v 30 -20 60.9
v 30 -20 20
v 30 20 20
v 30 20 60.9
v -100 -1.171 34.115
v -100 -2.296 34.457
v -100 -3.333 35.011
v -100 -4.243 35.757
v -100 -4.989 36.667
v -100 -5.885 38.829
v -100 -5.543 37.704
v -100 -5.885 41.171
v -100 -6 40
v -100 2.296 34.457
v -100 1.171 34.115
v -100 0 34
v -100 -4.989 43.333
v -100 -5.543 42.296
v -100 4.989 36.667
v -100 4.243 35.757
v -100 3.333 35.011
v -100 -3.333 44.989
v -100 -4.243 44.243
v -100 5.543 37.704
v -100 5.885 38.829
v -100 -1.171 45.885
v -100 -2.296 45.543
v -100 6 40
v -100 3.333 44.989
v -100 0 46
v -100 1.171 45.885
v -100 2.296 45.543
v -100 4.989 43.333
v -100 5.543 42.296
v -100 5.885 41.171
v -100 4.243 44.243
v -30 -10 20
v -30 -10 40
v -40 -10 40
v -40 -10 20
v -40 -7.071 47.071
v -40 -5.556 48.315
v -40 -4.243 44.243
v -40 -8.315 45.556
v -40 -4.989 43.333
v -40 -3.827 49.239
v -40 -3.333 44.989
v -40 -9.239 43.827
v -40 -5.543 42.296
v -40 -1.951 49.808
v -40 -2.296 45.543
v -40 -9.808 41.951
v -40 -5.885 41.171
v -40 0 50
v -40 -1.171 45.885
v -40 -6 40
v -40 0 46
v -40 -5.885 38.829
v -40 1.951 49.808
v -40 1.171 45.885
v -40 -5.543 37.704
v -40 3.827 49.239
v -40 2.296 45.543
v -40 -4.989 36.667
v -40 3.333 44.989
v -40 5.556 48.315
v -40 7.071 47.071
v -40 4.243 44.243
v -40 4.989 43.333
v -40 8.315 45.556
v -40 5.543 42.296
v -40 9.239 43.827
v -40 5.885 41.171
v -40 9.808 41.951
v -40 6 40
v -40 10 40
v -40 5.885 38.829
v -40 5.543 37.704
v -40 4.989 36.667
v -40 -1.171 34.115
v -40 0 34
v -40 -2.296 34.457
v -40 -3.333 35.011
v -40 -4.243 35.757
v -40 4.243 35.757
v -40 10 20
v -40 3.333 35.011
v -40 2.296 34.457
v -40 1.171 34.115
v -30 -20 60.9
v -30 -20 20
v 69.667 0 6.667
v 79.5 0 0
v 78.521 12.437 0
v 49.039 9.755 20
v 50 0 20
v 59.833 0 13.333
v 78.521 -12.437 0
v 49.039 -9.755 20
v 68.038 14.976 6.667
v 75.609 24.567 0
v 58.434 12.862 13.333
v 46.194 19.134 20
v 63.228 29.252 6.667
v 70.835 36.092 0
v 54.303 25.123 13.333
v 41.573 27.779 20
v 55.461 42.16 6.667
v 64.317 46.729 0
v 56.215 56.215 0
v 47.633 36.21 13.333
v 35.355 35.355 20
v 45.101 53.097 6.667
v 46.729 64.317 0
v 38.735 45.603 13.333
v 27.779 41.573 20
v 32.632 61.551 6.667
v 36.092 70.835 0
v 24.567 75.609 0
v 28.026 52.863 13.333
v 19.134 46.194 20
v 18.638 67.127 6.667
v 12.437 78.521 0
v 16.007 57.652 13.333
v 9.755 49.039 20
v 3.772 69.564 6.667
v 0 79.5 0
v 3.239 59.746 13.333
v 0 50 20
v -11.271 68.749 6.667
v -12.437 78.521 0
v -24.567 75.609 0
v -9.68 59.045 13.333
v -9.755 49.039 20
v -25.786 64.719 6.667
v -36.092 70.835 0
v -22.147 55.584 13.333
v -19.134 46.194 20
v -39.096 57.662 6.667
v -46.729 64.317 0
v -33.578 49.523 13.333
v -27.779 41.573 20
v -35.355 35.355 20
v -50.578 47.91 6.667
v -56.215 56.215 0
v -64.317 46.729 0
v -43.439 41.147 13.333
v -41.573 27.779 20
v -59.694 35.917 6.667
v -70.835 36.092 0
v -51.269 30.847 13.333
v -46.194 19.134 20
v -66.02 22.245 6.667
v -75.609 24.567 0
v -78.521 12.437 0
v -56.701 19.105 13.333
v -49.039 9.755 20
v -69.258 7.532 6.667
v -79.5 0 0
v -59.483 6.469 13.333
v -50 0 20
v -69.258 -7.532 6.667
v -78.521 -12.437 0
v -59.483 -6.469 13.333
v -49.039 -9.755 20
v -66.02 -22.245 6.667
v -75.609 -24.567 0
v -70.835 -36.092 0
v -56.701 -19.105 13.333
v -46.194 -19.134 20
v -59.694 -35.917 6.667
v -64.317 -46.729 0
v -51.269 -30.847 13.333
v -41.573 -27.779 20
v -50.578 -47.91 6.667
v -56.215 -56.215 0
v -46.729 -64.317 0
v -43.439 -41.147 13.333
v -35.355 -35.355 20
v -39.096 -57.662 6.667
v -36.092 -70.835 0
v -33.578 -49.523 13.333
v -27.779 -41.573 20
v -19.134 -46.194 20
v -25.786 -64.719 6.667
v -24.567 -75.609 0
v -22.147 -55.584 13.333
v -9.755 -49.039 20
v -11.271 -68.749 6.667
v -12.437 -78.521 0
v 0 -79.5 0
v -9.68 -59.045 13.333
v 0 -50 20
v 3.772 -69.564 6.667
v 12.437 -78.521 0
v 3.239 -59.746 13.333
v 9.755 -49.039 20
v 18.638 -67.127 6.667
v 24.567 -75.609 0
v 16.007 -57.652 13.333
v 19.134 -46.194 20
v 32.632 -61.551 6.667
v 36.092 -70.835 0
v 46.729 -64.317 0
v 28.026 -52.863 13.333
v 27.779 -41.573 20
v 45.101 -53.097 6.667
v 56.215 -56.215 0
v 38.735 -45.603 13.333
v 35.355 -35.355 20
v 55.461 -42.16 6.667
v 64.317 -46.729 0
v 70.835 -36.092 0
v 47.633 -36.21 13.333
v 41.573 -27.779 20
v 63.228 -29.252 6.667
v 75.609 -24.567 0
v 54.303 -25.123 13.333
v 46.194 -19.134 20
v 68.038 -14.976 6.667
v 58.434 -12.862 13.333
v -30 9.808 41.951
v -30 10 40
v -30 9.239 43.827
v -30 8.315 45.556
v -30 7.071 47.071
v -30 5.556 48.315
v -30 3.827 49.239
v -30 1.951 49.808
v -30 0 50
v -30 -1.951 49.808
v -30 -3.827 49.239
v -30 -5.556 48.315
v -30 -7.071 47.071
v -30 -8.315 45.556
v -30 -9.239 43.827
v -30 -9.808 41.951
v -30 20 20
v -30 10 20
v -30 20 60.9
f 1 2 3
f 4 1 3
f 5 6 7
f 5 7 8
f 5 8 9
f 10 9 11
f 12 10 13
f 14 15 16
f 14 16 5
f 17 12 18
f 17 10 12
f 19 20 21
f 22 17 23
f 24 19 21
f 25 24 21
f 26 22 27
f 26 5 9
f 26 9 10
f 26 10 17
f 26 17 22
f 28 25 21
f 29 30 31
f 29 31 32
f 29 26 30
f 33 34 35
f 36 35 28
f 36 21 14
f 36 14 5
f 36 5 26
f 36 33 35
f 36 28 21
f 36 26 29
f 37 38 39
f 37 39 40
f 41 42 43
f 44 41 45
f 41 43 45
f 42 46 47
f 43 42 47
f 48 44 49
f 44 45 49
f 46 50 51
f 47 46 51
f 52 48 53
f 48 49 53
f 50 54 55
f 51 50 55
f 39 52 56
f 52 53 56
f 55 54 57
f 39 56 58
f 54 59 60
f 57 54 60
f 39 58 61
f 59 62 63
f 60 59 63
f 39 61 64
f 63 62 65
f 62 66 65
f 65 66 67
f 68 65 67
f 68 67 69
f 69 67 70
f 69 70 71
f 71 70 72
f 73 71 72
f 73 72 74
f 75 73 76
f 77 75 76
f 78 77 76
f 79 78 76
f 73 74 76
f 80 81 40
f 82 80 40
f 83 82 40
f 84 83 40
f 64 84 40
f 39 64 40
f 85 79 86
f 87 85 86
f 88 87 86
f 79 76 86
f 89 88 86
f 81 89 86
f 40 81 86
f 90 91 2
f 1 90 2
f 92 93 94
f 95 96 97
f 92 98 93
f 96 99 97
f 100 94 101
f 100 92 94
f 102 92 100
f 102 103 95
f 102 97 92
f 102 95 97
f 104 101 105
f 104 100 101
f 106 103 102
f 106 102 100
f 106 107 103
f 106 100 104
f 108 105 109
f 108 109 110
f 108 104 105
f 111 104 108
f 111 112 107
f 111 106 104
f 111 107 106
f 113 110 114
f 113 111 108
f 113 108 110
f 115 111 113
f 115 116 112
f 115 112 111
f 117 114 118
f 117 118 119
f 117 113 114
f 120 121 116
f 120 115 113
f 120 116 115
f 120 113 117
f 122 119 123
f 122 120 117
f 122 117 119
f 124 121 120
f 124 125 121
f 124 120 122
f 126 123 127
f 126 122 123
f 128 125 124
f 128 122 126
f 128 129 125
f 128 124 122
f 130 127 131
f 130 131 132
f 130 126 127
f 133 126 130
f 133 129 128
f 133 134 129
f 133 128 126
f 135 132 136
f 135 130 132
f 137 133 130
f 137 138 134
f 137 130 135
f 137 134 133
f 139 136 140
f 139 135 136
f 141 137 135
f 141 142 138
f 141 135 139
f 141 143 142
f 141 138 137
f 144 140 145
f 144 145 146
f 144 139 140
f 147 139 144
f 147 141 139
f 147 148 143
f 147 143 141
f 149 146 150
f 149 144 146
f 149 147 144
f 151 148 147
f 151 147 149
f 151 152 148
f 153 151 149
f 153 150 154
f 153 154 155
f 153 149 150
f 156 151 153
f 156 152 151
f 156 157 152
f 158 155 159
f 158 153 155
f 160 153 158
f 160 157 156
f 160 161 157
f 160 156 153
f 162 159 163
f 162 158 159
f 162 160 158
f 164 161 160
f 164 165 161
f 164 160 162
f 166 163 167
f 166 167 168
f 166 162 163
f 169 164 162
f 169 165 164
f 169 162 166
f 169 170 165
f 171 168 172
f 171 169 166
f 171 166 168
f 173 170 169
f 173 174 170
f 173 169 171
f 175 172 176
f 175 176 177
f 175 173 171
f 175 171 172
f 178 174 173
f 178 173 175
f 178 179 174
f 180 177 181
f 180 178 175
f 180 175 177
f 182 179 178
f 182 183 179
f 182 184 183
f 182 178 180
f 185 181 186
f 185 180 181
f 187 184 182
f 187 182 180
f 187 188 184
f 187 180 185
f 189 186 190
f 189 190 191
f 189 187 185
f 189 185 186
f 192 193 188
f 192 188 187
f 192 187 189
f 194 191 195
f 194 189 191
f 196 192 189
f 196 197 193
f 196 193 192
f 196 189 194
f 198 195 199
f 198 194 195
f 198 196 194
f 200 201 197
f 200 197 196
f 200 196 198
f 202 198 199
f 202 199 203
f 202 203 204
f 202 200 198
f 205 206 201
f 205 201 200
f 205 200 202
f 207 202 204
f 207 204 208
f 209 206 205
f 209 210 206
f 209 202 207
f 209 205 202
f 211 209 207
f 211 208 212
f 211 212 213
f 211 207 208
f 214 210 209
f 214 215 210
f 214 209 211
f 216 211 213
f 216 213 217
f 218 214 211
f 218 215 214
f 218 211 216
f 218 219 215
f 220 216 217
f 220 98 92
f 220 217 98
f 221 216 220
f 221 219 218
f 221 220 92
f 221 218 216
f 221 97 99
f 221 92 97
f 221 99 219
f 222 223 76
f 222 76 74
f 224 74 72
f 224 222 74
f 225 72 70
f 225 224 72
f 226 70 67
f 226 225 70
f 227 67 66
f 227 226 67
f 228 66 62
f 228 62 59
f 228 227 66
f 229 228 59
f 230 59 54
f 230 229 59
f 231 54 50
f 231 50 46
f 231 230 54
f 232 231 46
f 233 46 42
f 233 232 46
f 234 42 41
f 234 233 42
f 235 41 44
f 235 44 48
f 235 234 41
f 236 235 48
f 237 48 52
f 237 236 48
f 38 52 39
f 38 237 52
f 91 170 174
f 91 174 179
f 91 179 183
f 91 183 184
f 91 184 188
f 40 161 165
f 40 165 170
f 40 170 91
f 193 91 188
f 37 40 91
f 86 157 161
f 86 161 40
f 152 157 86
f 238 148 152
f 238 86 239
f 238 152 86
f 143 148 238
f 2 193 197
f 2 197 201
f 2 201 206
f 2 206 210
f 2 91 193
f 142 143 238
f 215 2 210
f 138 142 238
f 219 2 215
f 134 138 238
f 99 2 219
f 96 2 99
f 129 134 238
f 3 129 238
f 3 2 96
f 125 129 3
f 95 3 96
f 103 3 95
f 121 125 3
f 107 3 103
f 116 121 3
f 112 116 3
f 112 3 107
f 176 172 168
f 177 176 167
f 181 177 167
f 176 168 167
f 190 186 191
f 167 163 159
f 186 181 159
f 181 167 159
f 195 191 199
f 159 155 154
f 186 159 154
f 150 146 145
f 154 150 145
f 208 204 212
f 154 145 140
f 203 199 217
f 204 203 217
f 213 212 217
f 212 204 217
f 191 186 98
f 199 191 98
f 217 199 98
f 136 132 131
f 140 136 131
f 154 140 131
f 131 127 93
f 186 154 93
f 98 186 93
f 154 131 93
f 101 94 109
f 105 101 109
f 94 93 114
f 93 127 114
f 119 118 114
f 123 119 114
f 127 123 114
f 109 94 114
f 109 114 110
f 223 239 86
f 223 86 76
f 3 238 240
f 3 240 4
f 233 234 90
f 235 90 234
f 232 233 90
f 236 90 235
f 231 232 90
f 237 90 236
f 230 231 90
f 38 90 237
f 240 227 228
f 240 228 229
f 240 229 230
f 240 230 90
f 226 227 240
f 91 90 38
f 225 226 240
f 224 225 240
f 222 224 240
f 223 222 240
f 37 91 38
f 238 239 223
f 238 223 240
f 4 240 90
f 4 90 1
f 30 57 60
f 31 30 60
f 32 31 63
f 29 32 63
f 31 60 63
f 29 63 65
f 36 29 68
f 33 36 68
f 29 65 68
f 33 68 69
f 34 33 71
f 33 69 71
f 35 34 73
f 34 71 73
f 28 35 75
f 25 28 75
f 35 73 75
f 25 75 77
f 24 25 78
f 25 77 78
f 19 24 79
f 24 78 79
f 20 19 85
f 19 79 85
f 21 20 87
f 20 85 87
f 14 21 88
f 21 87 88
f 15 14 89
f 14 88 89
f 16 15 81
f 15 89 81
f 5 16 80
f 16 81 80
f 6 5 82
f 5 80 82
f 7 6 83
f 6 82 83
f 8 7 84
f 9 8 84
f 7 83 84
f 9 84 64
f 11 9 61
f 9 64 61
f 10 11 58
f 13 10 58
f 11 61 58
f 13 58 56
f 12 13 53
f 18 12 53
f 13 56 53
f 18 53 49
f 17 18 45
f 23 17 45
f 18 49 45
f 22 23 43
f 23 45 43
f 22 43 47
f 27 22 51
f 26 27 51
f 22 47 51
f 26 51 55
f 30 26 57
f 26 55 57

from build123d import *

# Parameters (mm, degrees)
SKETCH_2_R      = 79.5
SKETCH_3_R      = 50
SKETCH_4_W      = 60
SKETCH_4_H      = 40
EXTRUDE_1_DEPTH = 40.9
EXTRUDE_2_DEPTH = 10
SKETCH_6_R      = 6
EXTRUDE_3_DEPTH = 60


with BuildPart() as part:
    # 草图2 → 放样1 section 0
    with BuildSketch(Plane.XY):
        Circle(SKETCH_2_R)
    # 草图3 → 放样1 section 1
    with BuildSketch(Plane.XY.offset(20)):
        Circle(SKETCH_3_R)
    loft()

    # 草图4 → 凸台-拉伸1 (add)
    with BuildSketch(Plane.XY.offset(20)):
        Rectangle(SKETCH_4_W, SKETCH_4_H)
    extrude(amount=EXTRUDE_1_DEPTH)

    # 草图5 → 凸台-拉伸2 (add)
    with BuildSketch(Plane.ZY.offset(30)):
        with BuildLine():
            Line((20, 10), (40, 10))
            ThreePointArc((40, 10), (50, 0), (40, -10))
            Line((40, -10), (20, -10))
            Line((20, -10), (20, 10))
        make_face()
    extrude(amount=EXTRUDE_2_DEPTH)

    # 草图6 → 凸台-拉伸3 (add)
    with BuildSketch(Plane.ZY.offset(40)):
        with Locations((40, 0)):
            Circle(SKETCH_6_R)
    extrude(amount=EXTRUDE_3_DEPTH)


solid = part.part
